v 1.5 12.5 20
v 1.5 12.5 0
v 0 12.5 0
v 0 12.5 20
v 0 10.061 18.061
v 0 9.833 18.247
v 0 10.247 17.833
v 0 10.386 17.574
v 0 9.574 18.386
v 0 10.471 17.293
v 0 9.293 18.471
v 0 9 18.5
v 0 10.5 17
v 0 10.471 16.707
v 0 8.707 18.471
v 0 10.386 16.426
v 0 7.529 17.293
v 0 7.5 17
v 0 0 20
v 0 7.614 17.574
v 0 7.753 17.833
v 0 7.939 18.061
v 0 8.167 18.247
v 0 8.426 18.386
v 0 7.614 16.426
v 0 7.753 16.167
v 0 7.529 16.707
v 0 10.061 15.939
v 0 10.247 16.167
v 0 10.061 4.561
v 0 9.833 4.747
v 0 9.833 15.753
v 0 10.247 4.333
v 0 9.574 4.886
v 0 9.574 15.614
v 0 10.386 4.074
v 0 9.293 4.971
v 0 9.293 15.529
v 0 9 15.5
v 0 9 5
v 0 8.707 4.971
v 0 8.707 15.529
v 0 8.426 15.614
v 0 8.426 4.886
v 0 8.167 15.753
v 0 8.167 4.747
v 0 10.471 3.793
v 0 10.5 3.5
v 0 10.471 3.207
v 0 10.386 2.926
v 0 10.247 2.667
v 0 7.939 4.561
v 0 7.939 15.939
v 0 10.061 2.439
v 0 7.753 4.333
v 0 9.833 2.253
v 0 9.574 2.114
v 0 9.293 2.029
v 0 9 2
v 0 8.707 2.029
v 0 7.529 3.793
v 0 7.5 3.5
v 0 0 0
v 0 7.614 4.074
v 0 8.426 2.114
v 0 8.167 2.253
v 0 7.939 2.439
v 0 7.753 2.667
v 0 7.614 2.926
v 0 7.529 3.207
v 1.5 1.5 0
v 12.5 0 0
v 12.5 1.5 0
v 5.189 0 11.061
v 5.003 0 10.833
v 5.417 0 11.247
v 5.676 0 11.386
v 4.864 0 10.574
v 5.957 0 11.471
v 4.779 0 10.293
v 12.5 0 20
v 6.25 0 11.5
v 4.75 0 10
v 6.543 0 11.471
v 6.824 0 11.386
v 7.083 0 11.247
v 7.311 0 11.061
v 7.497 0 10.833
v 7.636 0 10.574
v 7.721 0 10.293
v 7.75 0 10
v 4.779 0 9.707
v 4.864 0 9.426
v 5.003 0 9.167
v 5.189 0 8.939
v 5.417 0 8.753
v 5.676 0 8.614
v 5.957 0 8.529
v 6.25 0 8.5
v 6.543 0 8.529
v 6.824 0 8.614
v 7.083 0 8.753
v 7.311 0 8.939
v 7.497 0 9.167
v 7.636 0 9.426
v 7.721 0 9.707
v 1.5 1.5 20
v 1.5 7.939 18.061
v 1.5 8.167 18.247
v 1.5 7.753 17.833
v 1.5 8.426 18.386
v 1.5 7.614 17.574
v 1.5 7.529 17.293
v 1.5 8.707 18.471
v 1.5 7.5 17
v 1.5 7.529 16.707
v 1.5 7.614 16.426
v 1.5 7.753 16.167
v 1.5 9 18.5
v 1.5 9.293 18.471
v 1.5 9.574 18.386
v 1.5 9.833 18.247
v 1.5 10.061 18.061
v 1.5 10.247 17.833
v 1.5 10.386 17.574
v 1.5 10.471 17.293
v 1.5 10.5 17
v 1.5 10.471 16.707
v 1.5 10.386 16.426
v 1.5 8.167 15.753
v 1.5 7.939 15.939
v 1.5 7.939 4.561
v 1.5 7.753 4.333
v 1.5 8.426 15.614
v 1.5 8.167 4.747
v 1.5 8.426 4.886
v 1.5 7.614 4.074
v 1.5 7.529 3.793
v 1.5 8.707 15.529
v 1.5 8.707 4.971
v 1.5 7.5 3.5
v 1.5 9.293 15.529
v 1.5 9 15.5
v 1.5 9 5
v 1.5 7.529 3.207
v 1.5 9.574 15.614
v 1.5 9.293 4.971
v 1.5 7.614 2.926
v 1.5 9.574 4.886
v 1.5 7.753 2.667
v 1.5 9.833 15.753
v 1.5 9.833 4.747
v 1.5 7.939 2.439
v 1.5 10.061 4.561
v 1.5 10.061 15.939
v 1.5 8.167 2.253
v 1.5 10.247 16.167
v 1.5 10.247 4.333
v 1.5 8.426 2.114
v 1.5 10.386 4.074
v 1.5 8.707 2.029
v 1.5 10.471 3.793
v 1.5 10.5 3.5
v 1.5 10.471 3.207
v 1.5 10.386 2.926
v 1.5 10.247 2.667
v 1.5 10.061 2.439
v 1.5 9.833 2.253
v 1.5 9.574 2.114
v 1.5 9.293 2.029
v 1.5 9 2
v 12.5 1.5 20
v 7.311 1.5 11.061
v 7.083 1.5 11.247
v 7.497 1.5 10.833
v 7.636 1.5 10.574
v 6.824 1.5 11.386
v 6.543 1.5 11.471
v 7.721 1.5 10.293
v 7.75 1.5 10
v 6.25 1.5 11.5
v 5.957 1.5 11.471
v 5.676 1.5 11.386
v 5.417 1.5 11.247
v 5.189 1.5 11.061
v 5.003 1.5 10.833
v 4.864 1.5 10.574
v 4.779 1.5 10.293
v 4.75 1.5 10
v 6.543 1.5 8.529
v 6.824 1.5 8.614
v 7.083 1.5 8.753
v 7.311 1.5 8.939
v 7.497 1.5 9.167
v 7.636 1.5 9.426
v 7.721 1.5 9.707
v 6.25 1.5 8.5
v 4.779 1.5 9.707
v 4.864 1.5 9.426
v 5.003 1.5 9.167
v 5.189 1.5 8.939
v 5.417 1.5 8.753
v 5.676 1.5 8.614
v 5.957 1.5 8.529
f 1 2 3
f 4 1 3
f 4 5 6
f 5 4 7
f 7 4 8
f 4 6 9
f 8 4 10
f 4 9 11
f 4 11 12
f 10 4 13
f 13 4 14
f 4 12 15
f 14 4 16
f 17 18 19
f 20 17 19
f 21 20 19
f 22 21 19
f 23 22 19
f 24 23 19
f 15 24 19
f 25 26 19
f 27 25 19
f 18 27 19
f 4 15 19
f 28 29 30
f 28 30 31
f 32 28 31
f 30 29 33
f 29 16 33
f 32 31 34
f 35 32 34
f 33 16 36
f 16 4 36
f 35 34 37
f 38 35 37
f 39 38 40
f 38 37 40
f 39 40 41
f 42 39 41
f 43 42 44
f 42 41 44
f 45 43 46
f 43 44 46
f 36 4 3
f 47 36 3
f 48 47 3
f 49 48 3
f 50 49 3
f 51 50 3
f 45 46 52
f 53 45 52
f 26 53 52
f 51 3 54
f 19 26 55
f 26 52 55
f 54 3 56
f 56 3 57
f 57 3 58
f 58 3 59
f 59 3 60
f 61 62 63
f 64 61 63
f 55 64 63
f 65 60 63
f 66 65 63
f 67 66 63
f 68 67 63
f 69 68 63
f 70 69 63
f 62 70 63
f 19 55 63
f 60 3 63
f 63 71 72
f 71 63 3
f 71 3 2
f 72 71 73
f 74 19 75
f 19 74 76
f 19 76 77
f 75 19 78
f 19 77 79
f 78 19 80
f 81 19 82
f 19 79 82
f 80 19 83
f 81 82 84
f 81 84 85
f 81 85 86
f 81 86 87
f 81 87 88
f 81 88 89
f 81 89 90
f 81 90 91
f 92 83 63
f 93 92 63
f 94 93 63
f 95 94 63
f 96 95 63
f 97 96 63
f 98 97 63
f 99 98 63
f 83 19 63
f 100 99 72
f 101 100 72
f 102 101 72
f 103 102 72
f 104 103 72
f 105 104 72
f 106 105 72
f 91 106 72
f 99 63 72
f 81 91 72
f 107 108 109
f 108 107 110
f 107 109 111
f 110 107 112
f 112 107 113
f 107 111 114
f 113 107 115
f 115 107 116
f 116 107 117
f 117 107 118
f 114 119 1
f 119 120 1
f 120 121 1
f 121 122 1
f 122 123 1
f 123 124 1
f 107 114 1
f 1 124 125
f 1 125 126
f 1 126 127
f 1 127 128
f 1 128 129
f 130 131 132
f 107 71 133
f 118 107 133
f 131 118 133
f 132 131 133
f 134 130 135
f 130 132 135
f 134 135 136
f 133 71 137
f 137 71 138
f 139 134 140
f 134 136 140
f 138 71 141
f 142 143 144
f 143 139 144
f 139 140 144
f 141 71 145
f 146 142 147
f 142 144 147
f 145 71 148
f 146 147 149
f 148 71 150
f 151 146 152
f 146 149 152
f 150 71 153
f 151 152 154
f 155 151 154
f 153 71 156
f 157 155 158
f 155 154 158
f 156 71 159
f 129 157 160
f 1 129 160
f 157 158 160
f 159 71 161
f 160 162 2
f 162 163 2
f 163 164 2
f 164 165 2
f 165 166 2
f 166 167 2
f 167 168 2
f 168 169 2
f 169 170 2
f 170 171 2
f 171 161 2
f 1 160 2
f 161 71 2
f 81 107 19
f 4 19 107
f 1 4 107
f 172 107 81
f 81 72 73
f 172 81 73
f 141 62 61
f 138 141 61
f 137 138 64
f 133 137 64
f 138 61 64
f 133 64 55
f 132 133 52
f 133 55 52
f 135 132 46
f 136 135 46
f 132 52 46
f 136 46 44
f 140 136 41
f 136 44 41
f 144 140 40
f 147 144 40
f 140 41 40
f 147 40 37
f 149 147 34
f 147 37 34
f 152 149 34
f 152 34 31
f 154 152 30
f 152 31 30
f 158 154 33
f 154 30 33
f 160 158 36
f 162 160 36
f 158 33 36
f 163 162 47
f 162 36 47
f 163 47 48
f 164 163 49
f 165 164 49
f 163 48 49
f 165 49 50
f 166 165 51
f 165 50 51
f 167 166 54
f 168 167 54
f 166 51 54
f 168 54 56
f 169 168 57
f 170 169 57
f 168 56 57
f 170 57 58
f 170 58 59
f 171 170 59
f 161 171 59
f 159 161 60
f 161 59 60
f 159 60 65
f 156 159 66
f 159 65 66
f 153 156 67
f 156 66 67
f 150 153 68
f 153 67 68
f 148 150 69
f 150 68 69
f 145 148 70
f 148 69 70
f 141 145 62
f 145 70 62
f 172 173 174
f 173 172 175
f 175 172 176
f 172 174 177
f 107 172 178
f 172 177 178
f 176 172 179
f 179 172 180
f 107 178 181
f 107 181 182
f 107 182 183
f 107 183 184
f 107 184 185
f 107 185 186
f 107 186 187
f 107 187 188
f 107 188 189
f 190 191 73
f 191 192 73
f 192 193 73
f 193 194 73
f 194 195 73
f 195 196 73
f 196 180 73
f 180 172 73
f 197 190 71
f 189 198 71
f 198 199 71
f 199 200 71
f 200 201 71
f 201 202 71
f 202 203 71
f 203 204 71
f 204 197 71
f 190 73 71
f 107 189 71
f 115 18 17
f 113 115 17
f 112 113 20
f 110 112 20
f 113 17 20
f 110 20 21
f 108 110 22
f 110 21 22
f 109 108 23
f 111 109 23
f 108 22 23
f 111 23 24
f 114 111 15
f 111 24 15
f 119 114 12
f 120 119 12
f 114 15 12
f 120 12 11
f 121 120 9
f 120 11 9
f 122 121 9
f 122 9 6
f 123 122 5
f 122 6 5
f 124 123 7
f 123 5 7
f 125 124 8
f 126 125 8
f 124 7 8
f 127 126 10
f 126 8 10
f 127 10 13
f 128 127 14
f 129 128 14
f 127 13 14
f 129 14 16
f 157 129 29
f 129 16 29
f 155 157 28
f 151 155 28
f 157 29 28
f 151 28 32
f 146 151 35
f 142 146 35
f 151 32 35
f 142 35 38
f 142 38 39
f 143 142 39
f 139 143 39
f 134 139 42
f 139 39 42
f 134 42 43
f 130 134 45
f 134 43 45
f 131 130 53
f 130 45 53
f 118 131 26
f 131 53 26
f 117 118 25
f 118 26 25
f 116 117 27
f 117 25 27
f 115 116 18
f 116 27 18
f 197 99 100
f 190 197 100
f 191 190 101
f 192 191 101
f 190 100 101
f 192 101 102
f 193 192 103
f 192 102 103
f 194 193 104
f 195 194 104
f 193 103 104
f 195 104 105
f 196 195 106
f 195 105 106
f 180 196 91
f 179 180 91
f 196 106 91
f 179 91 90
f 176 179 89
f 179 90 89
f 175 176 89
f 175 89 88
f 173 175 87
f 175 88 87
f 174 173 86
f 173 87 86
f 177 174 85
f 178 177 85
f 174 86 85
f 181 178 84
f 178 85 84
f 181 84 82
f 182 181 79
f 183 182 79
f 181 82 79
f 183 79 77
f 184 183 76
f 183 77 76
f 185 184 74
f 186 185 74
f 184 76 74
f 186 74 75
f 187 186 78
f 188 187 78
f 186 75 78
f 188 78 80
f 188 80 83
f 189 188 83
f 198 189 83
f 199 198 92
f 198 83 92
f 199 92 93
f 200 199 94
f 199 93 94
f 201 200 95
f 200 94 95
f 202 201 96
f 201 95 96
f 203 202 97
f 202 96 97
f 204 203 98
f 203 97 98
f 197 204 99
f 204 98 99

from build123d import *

# Parameters (mm, degrees)
SALIENTE_EXTRUIR1_DEPTH = 20
CROQUIS2_R              = 1.5
CORTAR_EXTRUIR1_DEPTH   = 1.5
CROQUIS3_R              = 1.5
CORTAR_EXTRUIR2_DEPTH   = 1.5


with BuildPart() as part:
    # Croquis1 → Saliente-Extruir1 (new body)
    with BuildSketch(Plane.XY):
        Polygon((0, 0), (12.5, 0), (12.5, 1.5), (1.5, 1.5), (1.5, 12.5), (0, 12.5), align=None)
    extrude(amount=SALIENTE_EXTRUIR1_DEPTH)

    # Croquis2 → Cortar-Extruir1 (cut)
    with BuildSketch(Plane.ZY):
        with Locations(Location((17, 9, 0), (0, 0, 270))):
            Circle(CROQUIS2_R)
        with Locations(Location((3.5, 9, 0), (0, 0, 270))):
            Circle(CROQUIS2_R)
    extrude(amount=-CORTAR_EXTRUIR1_DEPTH, mode=Mode.SUBTRACT)

    # Croquis3 → Cortar-Extruir2 (cut)
    with BuildSketch(Plane.XZ):
        with Locations(Location((6.25, 10, 0), (0, 0, 270))):
            Circle(CROQUIS3_R)
    extrude(amount=-CORTAR_EXTRUIR2_DEPTH, mode=Mode.SUBTRACT)


solid = part.part
